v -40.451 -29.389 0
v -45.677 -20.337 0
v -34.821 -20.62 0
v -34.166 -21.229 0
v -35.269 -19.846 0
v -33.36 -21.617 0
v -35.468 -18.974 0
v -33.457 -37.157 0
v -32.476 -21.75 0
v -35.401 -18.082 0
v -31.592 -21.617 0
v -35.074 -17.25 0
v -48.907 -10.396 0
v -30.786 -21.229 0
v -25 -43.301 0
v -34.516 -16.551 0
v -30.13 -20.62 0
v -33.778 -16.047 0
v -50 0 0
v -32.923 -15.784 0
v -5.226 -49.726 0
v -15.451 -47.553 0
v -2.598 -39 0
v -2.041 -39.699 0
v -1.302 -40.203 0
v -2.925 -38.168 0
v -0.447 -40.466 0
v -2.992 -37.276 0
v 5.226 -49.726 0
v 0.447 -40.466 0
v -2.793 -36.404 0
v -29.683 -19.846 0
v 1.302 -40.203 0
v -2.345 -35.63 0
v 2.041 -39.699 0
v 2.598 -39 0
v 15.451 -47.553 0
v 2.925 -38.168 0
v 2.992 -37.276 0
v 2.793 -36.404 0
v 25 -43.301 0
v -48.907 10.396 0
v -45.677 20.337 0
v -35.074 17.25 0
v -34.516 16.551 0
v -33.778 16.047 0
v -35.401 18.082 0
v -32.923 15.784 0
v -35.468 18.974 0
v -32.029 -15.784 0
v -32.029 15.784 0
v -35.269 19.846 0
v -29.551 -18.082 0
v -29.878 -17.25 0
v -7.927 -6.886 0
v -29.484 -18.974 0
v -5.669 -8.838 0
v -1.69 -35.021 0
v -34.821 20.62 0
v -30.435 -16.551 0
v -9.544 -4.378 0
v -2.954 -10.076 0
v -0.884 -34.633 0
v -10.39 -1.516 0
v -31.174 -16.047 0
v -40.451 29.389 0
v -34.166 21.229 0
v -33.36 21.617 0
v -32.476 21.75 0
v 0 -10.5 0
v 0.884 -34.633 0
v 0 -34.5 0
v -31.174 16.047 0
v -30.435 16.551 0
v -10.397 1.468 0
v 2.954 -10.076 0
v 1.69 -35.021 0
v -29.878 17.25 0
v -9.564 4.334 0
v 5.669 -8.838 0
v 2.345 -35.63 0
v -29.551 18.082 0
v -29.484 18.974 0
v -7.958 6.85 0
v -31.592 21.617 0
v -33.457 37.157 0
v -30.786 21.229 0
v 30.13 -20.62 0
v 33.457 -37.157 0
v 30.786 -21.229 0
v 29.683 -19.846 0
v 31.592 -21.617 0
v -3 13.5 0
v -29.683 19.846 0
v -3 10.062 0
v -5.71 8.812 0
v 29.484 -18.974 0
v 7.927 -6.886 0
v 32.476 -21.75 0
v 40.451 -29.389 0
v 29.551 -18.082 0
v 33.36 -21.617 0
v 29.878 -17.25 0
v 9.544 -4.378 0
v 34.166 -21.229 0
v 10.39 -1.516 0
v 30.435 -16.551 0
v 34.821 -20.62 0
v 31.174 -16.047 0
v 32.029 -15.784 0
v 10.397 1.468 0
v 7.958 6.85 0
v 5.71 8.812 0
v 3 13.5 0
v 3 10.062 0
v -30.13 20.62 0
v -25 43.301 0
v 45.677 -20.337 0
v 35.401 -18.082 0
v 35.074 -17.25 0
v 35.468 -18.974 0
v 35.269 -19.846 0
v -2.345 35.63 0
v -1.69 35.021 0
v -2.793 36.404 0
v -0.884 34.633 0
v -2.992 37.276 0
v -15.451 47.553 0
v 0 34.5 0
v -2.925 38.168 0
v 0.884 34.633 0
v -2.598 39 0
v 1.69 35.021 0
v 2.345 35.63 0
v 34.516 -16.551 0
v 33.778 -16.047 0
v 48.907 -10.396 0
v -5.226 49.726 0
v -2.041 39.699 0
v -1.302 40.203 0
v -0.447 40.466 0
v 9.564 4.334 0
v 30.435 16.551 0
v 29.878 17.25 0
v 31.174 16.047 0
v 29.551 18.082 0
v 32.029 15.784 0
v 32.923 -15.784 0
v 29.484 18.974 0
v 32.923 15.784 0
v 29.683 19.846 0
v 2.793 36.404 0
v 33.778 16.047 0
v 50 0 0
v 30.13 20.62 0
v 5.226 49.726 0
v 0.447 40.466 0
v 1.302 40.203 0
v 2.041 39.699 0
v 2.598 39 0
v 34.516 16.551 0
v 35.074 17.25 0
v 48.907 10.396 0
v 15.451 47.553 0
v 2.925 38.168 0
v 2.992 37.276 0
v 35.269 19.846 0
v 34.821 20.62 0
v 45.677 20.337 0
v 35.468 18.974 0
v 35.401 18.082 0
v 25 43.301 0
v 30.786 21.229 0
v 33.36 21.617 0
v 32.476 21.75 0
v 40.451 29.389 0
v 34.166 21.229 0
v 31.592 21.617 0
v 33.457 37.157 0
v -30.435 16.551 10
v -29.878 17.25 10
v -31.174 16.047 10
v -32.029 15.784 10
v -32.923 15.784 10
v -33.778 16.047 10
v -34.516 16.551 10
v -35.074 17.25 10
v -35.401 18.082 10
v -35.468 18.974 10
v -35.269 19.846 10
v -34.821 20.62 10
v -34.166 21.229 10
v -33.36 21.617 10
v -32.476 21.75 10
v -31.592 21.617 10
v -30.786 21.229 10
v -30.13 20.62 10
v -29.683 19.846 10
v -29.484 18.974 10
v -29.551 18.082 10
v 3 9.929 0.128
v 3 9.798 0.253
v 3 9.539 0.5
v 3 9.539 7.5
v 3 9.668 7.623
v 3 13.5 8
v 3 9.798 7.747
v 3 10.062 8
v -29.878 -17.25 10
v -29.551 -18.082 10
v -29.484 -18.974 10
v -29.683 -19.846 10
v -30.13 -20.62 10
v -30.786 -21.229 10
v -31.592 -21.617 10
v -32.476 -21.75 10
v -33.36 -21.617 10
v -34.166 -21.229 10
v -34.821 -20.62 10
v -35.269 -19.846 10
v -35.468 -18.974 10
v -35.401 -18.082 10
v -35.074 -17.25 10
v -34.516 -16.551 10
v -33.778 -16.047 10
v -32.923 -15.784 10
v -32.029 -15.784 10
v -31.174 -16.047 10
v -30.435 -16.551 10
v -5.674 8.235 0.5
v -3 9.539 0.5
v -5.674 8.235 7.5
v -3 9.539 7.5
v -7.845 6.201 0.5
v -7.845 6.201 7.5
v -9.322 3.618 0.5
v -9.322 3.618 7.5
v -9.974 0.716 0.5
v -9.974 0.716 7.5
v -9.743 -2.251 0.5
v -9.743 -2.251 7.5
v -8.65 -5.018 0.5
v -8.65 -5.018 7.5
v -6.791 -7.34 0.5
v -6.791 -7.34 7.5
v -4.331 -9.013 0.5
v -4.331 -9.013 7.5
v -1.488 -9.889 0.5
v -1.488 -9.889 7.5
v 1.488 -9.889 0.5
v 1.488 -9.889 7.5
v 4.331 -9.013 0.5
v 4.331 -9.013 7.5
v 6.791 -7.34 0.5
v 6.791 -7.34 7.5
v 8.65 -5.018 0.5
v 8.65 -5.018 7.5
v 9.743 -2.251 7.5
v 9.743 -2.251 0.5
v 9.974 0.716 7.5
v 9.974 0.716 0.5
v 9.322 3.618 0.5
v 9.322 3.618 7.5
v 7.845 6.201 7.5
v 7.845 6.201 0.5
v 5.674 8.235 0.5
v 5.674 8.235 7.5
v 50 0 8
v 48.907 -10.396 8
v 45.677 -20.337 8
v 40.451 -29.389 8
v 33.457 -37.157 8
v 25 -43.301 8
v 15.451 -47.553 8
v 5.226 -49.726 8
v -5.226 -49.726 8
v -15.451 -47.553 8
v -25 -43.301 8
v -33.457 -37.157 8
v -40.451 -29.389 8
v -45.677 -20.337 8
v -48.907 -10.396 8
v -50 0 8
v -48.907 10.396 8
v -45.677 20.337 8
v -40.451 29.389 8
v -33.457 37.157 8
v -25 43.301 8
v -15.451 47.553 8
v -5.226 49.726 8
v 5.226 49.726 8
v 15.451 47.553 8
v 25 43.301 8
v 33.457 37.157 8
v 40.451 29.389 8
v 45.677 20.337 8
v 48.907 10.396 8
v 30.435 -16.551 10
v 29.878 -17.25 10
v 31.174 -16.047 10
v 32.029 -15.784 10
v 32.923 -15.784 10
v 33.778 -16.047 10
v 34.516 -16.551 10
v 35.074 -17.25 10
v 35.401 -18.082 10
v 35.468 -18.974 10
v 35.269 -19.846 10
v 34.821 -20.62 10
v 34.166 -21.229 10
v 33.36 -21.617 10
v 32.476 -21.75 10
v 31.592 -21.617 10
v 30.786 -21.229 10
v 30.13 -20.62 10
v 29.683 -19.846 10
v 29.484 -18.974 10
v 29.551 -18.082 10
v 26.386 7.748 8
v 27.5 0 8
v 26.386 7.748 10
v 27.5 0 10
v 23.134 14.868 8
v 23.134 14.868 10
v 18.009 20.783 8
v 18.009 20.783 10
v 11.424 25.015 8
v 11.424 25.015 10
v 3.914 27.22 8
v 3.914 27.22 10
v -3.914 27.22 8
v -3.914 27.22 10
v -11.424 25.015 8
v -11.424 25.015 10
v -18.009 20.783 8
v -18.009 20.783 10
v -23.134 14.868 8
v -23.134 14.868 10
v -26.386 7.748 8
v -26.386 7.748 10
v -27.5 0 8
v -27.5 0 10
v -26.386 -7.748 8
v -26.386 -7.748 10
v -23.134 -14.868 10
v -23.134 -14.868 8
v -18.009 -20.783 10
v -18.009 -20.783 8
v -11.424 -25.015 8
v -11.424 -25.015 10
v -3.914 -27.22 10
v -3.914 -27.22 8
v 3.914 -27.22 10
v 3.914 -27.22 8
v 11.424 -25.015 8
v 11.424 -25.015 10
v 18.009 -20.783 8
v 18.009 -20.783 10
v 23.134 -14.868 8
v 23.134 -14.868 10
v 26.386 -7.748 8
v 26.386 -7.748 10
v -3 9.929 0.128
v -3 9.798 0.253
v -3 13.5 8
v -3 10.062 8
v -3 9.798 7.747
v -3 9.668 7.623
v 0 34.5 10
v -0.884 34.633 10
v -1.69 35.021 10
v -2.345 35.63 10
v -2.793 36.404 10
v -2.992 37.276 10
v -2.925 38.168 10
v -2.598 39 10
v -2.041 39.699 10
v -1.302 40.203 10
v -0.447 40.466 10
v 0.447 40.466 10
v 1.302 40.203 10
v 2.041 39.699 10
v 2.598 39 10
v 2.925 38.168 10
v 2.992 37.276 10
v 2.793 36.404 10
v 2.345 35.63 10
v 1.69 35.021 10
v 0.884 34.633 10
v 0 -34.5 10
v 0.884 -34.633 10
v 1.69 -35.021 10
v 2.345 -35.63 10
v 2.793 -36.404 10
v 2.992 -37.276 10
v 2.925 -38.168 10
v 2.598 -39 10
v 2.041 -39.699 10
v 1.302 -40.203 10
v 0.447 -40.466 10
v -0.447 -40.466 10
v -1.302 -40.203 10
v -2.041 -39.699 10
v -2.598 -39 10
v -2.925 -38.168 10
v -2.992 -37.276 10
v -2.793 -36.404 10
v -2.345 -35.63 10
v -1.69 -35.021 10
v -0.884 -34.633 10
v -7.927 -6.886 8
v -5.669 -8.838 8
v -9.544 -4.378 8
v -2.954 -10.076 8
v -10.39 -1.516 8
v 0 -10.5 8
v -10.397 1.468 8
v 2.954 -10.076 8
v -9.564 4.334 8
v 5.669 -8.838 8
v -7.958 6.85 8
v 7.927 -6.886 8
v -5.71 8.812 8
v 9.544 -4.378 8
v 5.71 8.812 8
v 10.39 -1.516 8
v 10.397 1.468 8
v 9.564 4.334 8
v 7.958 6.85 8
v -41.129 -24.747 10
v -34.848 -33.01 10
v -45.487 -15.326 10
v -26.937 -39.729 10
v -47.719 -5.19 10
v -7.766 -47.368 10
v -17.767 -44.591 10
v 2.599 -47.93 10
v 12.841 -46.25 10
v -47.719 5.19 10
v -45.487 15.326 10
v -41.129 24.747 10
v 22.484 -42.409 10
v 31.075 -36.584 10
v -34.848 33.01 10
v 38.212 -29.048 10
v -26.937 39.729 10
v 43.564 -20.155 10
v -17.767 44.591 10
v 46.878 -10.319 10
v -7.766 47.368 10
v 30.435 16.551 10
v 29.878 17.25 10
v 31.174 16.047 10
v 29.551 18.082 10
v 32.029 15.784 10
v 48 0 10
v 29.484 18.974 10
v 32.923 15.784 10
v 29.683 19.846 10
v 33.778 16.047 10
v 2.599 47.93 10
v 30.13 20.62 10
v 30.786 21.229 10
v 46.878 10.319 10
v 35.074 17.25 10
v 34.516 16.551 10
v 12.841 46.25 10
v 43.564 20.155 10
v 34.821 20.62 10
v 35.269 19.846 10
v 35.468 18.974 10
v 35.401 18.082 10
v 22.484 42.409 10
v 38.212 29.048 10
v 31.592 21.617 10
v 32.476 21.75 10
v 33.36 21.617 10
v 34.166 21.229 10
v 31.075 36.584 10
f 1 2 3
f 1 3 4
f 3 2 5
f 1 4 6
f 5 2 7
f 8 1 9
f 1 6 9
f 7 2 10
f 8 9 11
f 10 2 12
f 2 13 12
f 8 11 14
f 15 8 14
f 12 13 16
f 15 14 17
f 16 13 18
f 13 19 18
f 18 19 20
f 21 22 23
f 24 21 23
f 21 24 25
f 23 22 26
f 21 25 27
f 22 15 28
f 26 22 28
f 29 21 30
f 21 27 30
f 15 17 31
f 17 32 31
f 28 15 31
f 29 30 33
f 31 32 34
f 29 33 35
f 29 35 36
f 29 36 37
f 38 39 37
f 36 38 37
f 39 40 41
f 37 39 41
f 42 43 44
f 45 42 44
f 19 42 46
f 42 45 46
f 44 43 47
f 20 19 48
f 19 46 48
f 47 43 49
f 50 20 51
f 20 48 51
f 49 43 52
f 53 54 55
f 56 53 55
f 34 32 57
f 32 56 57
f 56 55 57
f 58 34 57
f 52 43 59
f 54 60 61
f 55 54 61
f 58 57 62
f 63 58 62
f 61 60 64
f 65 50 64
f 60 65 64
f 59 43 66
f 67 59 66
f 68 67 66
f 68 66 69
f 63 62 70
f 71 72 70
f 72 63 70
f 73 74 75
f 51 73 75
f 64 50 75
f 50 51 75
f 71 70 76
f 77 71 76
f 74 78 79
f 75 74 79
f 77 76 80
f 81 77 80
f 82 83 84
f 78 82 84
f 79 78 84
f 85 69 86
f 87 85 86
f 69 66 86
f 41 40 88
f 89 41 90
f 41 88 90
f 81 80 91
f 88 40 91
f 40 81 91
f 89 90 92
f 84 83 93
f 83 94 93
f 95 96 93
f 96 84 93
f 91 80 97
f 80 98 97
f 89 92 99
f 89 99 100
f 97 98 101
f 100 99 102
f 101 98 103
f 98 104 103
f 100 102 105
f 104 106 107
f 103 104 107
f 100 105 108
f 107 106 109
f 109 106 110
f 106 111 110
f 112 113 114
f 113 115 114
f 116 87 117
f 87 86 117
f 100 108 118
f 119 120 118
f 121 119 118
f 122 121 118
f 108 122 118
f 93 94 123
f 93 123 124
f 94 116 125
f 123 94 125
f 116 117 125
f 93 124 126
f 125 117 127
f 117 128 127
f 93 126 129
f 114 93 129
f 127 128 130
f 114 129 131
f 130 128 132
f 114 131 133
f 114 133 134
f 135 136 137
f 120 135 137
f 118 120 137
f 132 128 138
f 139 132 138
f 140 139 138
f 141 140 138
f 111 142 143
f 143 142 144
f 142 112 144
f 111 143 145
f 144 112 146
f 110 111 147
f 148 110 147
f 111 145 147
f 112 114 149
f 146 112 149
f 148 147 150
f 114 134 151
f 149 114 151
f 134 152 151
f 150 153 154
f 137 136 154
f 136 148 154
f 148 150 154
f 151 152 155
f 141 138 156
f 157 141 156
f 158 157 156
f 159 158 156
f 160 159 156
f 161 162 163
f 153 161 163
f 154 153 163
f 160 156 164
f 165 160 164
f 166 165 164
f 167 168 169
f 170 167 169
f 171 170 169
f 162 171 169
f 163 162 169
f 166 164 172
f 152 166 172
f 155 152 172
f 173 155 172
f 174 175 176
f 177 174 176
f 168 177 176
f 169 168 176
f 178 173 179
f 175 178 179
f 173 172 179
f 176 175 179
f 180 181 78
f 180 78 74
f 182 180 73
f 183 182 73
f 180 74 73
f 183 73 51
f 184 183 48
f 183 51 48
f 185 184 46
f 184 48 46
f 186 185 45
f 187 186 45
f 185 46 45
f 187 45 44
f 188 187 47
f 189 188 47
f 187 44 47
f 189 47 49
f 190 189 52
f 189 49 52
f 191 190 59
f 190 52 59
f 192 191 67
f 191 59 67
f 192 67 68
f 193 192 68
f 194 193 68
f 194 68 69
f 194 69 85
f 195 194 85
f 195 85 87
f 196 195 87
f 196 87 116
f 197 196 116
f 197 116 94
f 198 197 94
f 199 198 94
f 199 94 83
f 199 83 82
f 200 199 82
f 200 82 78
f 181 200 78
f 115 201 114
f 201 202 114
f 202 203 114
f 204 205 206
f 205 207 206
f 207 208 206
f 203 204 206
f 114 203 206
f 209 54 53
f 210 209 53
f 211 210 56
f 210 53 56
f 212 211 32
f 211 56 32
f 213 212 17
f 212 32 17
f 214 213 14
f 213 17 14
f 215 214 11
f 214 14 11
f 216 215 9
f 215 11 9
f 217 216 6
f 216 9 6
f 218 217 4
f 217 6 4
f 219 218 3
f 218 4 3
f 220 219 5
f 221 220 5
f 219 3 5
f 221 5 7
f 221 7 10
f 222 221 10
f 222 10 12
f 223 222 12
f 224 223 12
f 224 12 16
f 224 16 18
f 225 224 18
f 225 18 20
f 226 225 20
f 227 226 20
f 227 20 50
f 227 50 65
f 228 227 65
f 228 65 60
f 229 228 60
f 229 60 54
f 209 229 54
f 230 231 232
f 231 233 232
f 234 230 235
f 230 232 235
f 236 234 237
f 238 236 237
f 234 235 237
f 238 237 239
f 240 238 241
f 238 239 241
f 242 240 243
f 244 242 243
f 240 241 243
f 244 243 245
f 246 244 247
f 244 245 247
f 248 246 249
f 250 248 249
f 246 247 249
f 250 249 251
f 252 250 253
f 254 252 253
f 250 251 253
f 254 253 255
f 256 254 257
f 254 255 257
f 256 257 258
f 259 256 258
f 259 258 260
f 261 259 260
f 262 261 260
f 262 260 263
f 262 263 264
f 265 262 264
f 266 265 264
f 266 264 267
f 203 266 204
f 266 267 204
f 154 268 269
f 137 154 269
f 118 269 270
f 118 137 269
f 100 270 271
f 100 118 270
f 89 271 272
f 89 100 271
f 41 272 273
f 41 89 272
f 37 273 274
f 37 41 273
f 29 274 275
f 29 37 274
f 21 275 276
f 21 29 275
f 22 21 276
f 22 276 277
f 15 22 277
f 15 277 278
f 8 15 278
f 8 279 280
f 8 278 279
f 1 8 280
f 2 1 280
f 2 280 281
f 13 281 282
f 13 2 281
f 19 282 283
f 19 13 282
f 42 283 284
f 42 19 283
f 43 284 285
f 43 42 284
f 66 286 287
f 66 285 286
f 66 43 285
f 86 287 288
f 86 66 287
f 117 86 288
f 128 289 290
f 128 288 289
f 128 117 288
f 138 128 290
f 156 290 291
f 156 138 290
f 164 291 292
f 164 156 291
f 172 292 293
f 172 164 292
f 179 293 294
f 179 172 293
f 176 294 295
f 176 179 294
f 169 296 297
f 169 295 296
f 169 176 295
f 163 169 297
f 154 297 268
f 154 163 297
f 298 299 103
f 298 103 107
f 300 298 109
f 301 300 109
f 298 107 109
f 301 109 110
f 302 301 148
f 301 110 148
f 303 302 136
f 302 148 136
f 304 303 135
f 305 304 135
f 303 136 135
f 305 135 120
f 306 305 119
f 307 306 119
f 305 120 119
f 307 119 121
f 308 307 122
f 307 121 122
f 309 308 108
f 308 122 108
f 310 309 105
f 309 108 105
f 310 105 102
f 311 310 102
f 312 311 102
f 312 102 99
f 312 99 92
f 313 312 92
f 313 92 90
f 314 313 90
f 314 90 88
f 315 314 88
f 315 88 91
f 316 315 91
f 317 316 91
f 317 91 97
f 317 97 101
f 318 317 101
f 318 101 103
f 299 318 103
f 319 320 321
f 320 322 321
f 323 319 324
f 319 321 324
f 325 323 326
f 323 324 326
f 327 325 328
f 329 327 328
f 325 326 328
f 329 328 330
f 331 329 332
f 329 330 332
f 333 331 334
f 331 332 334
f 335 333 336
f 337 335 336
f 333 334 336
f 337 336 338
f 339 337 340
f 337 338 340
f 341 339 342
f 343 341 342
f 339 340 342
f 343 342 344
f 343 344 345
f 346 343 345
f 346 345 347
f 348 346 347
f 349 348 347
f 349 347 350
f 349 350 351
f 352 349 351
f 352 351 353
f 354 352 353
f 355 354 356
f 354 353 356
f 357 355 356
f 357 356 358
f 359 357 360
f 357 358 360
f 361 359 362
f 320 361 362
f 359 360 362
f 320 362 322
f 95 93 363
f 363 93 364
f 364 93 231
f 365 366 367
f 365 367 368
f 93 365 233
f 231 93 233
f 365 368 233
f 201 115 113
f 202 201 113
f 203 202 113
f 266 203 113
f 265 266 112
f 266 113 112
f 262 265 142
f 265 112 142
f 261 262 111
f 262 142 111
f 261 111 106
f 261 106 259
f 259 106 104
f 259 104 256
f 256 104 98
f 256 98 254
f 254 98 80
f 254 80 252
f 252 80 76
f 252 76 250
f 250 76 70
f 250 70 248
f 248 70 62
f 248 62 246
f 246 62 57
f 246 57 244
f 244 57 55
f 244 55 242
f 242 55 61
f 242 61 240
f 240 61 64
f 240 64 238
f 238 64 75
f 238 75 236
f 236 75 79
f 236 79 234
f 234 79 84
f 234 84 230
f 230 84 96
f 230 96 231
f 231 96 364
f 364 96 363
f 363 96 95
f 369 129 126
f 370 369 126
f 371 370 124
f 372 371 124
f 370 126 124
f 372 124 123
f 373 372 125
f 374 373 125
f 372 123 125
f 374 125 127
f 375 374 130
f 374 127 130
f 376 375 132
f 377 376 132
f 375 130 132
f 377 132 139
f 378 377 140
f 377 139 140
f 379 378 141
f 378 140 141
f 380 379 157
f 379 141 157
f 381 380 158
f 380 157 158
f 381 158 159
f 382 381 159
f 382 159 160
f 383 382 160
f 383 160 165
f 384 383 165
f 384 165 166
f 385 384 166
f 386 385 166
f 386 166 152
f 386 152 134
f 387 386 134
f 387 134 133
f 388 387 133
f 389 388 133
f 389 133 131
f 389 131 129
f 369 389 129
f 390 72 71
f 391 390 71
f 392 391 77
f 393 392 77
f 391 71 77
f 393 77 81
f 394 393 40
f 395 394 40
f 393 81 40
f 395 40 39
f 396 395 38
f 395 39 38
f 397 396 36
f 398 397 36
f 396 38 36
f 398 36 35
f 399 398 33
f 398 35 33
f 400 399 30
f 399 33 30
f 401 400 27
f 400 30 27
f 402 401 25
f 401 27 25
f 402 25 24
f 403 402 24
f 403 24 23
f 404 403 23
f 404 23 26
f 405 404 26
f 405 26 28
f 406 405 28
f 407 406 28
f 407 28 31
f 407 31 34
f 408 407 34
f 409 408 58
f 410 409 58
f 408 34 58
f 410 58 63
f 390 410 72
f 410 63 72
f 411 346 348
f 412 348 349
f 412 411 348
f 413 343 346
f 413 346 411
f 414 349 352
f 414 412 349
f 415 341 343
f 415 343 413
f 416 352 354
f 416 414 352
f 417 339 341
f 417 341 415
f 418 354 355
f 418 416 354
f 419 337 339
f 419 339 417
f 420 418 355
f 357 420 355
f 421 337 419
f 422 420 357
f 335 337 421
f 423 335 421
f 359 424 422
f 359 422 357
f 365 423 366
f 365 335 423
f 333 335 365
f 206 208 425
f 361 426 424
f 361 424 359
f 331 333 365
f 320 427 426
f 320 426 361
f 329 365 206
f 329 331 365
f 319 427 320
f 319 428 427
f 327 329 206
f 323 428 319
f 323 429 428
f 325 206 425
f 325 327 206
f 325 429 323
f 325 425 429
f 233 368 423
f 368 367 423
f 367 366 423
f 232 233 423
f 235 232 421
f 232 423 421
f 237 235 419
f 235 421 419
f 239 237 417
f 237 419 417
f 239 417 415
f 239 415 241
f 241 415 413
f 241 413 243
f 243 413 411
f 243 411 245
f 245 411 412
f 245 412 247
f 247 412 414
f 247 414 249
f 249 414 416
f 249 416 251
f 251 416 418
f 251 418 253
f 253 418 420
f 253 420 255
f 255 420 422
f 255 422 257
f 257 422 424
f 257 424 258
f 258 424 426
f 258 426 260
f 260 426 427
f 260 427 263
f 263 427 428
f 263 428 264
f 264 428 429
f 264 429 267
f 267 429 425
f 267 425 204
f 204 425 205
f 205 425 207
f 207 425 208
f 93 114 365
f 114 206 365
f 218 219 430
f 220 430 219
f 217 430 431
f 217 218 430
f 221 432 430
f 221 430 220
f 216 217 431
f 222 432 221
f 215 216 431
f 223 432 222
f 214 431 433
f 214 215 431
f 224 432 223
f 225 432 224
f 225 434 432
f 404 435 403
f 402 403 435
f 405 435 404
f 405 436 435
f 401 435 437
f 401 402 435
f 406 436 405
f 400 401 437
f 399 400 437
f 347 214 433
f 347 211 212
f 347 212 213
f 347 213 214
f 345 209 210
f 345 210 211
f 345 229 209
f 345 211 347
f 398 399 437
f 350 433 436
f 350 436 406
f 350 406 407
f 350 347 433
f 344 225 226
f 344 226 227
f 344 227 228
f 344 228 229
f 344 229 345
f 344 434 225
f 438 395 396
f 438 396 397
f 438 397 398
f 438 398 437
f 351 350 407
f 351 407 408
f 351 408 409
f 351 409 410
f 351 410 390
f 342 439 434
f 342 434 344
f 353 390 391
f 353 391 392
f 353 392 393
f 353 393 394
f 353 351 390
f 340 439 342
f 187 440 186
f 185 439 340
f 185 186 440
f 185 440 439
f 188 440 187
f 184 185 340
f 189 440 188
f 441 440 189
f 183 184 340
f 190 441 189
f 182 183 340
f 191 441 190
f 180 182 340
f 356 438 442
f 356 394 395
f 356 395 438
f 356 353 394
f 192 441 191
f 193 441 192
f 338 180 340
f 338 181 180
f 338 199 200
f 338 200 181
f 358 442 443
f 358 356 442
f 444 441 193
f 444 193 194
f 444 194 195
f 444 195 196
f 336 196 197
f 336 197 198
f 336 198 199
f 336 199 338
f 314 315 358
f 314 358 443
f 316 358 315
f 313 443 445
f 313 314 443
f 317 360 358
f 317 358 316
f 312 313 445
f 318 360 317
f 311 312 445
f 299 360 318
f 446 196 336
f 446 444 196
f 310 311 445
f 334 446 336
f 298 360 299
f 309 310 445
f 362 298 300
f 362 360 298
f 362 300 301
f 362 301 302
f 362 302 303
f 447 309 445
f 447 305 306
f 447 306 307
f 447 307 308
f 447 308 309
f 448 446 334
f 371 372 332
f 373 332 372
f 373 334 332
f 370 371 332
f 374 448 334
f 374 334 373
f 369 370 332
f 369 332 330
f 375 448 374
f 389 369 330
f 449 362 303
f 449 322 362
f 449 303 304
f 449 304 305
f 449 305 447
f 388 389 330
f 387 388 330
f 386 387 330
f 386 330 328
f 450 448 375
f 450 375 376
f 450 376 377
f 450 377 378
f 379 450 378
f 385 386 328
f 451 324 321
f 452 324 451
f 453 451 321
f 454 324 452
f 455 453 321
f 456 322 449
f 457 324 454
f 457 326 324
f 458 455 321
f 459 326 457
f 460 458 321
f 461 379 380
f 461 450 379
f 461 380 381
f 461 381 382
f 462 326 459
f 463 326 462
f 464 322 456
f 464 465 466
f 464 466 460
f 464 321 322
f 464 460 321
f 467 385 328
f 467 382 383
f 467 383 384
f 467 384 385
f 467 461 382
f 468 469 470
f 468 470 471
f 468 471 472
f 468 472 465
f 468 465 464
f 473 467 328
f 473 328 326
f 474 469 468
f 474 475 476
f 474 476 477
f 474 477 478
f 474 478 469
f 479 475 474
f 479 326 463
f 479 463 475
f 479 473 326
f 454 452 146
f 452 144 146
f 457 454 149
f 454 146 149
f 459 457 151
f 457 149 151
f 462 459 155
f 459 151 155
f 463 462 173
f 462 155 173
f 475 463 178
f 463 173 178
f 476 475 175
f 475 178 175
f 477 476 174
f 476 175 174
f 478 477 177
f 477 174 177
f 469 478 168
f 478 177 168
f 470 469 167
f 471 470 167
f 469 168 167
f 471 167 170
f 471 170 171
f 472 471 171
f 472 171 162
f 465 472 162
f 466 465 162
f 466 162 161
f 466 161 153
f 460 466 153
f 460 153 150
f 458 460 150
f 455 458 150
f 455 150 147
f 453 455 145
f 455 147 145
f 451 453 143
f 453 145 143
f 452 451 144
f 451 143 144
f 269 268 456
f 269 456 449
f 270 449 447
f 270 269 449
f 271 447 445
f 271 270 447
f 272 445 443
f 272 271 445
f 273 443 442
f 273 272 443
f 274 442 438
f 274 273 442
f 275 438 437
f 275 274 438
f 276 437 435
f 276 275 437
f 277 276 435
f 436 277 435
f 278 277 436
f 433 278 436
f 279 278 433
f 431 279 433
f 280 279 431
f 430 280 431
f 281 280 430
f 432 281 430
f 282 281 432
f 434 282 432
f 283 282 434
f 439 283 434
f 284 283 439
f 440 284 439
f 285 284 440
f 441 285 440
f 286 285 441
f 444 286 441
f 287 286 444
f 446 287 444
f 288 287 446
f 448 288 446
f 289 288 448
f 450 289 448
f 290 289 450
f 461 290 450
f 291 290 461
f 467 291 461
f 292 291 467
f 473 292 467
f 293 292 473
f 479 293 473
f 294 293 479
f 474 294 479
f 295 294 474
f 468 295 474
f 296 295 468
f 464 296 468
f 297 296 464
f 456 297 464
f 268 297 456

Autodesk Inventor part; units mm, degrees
ref_plane "YZ Plane" through (0, 0, 0) normal (1, 0, 0) x (0, 1, 0)
ref_plane "XZ Plane" through (0, 0, 0) normal (0, 1, 0) x (-1, 0, 0)
ref_plane "XY Plane" through (0, 0, 0) normal (0, 0, 1) x (1, 0, 0)
sketch "Sketch1" plane through (0, 0, 0) normal (0, 0, 1) x (1, 0, 0)
  circle A0 centre (0, 0) radius 50
  dimension "d0" = 100
extrude "Extrusion1" add sketch "Sketch1" along normal blind 10
sketch "Sketch2" plane through (0, 0, 10) normal (0, 0, 1) x (1, 0, 0)
  arc A0 (-3, 9.5394) -> (3, 9.5394) centre (0, 0) ccw
  line L0 (3, 9.5394) -> (3, 13.5)
  line L1 (3, 13.5) -> (-3, 13.5)
  line L2 (-3, 13.5) -> (-3, 9.5394)
  line L3 (-3, 6.5) -> (3, 13.5) construction
  line L4 (3, 6.5) -> (-3, 13.5) construction
  point P0 (0, 10)
  dimension "d3" = 20
  dimension "d4" = 6
  dimension "d5" = 3.5
extrude "Extrusion2" cut sketch "Sketch2" against normal blind 10
chamfer "Chamfer1" distance 2 angle 45 1 edges at (-50, 0, 10)
sketch "Sketch3" plane through (0, 0, 10) normal (0, 0, 1) x (1, 0, 0)
  circle A0 centre (0, 0) radius 27.5
  dimension "d11" = 55
extrude "Extrusion3" cut sketch "Sketch3" against normal blind 2
chamfer "Chamfer2" distance 0.5 angle 45 2 edges at (0, -10, 0) (0, -10, 8)
sketch "Sketch4" plane through (0, 0, 10) normal (0, 0, 1) x (1, 0, 0)
  line L0 (0, 0) -> (0, 37.5)
  circle A0 centre (0, 37.5) radius 3
  dimension "d17" = 37.5
  dimension "d18" = 6
hole "Hole1" at (0, 37.5, 10) direction (0, 0, -1) diameter 6 end through all
pattern_circular "Circular Pattern1" count 6 over 360 about axis through (0, 0, 10) along (0, 0, -1) of "Hole1"
properties part number "Hub Flange"
